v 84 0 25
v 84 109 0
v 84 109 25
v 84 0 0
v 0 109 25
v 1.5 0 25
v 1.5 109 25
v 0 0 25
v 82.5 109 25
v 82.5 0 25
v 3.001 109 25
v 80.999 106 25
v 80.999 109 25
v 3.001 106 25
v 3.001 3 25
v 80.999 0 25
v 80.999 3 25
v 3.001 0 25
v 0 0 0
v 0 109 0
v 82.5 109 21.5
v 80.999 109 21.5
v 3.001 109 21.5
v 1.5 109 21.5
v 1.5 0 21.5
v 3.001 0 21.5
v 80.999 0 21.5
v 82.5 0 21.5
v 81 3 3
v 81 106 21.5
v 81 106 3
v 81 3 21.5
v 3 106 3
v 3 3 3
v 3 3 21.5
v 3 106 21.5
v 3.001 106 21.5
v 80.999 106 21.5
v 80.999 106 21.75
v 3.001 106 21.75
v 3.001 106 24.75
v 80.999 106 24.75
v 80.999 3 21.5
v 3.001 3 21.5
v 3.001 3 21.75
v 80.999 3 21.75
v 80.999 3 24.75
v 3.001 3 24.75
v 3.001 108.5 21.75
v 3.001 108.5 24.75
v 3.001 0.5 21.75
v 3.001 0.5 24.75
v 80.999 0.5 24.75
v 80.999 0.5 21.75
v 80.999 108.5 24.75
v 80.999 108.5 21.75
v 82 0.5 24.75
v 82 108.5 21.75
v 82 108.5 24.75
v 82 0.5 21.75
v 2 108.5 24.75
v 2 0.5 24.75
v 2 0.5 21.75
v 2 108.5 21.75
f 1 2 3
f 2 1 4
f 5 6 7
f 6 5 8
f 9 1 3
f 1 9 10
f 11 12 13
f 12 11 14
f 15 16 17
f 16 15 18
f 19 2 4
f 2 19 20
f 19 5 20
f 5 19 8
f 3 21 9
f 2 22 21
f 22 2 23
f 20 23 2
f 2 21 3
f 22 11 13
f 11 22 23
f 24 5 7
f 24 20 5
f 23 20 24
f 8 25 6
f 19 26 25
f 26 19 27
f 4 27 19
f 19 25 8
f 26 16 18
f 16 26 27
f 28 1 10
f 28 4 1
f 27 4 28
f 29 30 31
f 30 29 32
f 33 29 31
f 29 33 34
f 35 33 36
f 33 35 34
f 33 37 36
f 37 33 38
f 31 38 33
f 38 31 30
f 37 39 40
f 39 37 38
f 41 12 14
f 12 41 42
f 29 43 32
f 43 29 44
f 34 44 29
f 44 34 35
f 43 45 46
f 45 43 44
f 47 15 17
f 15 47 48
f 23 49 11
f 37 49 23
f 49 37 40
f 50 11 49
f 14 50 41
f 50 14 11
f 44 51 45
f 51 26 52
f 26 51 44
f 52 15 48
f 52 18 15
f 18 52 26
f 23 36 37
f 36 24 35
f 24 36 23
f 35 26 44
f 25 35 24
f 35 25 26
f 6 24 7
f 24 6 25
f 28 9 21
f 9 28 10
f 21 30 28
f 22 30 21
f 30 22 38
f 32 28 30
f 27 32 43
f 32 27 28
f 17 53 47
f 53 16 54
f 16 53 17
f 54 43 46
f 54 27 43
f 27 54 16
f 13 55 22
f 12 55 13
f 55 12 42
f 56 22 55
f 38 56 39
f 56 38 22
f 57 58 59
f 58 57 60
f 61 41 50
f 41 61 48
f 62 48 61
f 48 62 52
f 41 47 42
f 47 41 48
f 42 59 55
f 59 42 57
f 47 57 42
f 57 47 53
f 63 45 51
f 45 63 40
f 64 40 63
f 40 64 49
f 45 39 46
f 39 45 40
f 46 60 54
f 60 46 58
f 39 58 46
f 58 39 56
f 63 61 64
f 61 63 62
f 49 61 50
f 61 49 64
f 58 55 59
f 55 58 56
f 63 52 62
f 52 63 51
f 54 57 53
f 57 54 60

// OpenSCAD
// Caixa de transporte para 10 toploaders deitados em pilha, com tampa deslizante.
// Mesmo padrão de tampa da caixa de envio original: trilhos nas paredes laterais
// e tampa plana que desliza por eles.
//
// Medidas:
//   toploader: 77 x 102 mm, espessura 2 mm (medida pelo usuário)
//   pilha: 10 toploaders = 20 mm de altura
//
// Export (uma peça por arquivo, e a chapa com as duas na cama):
//   openscad -o <abs>/toploader-box-10-01-caixa.stl -D 'part="caixa"' <abs>/toploader-box-10-01.scad
//   openscad -o <abs>/toploader-box-10-01-tampa.stl -D 'part="tampa"' <abs>/toploader-box-10-01.scad
//   openscad -o <abs>/toploader-box-10-01-chapa.stl -D 'part="chapa"' <abs>/toploader-box-10-01.scad

part = "montado"; // "caixa" | "tampa" | "chapa" (as duas na cama) | "montado" (preview)

// --- toploader ---
tl_w = 77;           // mm
tl_h = 102;          // mm
tl_t = 2;            // mm, espessura medida
n    = 10;           // quantidade na pilha
clr  = 0.5;          // mm por lado, folga do toploader no interior

// --- caixa ---
wall      = 3;       // mm, parede
floor_t   = 3;       // mm, fundo
top_gap   = 2;       // mm, folga entre a pilha e o topo da caixa
gdepth    = 1.5;     // mm, profundidade do trilho na parede
gh        = 3.5;     // mm, altura do trilho (a tampa tem 3, com folga)

// --- tampa ---
lid_t    = 3;        // mm, espessura da tampa
lid_clr  = 0.25;     // mm, folga da tampa no trilho (em Z)
lid_gap  = 0.5;      // mm, folga da tampa no trilho (em X) e nas pontas (em Y)

// --- derivados ---
inner_w = tl_w + 2*clr;          // 78
inner_l = tl_h + 2*clr;          // 103
stack   = n * tl_t;              // 20
inner_h = stack + top_gap;       // 22
Xo = inner_w + 2*wall;           // 84
Yo = inner_l + 2*wall;           // 109
Zo = floor_t + inner_h;          // 25

// trilho: largura em X vai da face externa do trilho até a face interna da parede
rail_x0 = wall - gdepth;         // 1.5 (face externa do trilho, esquerda)
lid_x0  = rail_x0 + lid_gap;     // 2.0 (borda da tampa, esquerda)
lid_w   = Xo - 2*lid_x0;         // 80
lid_l   = Yo - 2*lid_gap;        // 108
lid_z0  = Zo - gh + lid_clr;     // 21.75 (base da tampa montada)

echo(str("interior ", inner_w, " x ", inner_l, " x ", inner_h));
echo(str("caixa ", Xo, " x ", Yo, " x ", Zo));
echo(str("tampa ", lid_w, " x ", lid_l, " x ", lid_t));

module caixa() {
    difference() {
        cube([Xo, Yo, Zo]);

        // interior: pilha de toploaders
        translate([wall, wall, floor_t])
            cube([inner_w, inner_l, inner_h + 1]);

        // trilhos nas duas paredes laterais, abertos nas pontas (a tampa entra por elas)
        translate([rail_x0, -1, Zo - gh])
            cube([gdepth + 0.001, Yo + 2, gh + 1]);
        translate([Xo - wall - 0.001, -1, Zo - gh])
            cube([gdepth + 0.001, Yo + 2, gh + 1]);
    }
}

module tampa_montada() {
    translate([lid_x0, lid_gap, lid_z0])
        cube([lid_w, lid_l, lid_t]);
}

// tampa deitada na cama, para impressão
module tampa_print(x_off) {
    translate([x_off, lid_gap, 0])
        cube([lid_w, lid_l, lid_t]);
}

if (part == "caixa") {
    caixa();
} else if (part == "tampa") {
    tampa_print(0);
} else if (part == "chapa") {
    caixa();
    tampa_print(Xo + 10);
} else {
    caixa();
    tampa_montada();
}
